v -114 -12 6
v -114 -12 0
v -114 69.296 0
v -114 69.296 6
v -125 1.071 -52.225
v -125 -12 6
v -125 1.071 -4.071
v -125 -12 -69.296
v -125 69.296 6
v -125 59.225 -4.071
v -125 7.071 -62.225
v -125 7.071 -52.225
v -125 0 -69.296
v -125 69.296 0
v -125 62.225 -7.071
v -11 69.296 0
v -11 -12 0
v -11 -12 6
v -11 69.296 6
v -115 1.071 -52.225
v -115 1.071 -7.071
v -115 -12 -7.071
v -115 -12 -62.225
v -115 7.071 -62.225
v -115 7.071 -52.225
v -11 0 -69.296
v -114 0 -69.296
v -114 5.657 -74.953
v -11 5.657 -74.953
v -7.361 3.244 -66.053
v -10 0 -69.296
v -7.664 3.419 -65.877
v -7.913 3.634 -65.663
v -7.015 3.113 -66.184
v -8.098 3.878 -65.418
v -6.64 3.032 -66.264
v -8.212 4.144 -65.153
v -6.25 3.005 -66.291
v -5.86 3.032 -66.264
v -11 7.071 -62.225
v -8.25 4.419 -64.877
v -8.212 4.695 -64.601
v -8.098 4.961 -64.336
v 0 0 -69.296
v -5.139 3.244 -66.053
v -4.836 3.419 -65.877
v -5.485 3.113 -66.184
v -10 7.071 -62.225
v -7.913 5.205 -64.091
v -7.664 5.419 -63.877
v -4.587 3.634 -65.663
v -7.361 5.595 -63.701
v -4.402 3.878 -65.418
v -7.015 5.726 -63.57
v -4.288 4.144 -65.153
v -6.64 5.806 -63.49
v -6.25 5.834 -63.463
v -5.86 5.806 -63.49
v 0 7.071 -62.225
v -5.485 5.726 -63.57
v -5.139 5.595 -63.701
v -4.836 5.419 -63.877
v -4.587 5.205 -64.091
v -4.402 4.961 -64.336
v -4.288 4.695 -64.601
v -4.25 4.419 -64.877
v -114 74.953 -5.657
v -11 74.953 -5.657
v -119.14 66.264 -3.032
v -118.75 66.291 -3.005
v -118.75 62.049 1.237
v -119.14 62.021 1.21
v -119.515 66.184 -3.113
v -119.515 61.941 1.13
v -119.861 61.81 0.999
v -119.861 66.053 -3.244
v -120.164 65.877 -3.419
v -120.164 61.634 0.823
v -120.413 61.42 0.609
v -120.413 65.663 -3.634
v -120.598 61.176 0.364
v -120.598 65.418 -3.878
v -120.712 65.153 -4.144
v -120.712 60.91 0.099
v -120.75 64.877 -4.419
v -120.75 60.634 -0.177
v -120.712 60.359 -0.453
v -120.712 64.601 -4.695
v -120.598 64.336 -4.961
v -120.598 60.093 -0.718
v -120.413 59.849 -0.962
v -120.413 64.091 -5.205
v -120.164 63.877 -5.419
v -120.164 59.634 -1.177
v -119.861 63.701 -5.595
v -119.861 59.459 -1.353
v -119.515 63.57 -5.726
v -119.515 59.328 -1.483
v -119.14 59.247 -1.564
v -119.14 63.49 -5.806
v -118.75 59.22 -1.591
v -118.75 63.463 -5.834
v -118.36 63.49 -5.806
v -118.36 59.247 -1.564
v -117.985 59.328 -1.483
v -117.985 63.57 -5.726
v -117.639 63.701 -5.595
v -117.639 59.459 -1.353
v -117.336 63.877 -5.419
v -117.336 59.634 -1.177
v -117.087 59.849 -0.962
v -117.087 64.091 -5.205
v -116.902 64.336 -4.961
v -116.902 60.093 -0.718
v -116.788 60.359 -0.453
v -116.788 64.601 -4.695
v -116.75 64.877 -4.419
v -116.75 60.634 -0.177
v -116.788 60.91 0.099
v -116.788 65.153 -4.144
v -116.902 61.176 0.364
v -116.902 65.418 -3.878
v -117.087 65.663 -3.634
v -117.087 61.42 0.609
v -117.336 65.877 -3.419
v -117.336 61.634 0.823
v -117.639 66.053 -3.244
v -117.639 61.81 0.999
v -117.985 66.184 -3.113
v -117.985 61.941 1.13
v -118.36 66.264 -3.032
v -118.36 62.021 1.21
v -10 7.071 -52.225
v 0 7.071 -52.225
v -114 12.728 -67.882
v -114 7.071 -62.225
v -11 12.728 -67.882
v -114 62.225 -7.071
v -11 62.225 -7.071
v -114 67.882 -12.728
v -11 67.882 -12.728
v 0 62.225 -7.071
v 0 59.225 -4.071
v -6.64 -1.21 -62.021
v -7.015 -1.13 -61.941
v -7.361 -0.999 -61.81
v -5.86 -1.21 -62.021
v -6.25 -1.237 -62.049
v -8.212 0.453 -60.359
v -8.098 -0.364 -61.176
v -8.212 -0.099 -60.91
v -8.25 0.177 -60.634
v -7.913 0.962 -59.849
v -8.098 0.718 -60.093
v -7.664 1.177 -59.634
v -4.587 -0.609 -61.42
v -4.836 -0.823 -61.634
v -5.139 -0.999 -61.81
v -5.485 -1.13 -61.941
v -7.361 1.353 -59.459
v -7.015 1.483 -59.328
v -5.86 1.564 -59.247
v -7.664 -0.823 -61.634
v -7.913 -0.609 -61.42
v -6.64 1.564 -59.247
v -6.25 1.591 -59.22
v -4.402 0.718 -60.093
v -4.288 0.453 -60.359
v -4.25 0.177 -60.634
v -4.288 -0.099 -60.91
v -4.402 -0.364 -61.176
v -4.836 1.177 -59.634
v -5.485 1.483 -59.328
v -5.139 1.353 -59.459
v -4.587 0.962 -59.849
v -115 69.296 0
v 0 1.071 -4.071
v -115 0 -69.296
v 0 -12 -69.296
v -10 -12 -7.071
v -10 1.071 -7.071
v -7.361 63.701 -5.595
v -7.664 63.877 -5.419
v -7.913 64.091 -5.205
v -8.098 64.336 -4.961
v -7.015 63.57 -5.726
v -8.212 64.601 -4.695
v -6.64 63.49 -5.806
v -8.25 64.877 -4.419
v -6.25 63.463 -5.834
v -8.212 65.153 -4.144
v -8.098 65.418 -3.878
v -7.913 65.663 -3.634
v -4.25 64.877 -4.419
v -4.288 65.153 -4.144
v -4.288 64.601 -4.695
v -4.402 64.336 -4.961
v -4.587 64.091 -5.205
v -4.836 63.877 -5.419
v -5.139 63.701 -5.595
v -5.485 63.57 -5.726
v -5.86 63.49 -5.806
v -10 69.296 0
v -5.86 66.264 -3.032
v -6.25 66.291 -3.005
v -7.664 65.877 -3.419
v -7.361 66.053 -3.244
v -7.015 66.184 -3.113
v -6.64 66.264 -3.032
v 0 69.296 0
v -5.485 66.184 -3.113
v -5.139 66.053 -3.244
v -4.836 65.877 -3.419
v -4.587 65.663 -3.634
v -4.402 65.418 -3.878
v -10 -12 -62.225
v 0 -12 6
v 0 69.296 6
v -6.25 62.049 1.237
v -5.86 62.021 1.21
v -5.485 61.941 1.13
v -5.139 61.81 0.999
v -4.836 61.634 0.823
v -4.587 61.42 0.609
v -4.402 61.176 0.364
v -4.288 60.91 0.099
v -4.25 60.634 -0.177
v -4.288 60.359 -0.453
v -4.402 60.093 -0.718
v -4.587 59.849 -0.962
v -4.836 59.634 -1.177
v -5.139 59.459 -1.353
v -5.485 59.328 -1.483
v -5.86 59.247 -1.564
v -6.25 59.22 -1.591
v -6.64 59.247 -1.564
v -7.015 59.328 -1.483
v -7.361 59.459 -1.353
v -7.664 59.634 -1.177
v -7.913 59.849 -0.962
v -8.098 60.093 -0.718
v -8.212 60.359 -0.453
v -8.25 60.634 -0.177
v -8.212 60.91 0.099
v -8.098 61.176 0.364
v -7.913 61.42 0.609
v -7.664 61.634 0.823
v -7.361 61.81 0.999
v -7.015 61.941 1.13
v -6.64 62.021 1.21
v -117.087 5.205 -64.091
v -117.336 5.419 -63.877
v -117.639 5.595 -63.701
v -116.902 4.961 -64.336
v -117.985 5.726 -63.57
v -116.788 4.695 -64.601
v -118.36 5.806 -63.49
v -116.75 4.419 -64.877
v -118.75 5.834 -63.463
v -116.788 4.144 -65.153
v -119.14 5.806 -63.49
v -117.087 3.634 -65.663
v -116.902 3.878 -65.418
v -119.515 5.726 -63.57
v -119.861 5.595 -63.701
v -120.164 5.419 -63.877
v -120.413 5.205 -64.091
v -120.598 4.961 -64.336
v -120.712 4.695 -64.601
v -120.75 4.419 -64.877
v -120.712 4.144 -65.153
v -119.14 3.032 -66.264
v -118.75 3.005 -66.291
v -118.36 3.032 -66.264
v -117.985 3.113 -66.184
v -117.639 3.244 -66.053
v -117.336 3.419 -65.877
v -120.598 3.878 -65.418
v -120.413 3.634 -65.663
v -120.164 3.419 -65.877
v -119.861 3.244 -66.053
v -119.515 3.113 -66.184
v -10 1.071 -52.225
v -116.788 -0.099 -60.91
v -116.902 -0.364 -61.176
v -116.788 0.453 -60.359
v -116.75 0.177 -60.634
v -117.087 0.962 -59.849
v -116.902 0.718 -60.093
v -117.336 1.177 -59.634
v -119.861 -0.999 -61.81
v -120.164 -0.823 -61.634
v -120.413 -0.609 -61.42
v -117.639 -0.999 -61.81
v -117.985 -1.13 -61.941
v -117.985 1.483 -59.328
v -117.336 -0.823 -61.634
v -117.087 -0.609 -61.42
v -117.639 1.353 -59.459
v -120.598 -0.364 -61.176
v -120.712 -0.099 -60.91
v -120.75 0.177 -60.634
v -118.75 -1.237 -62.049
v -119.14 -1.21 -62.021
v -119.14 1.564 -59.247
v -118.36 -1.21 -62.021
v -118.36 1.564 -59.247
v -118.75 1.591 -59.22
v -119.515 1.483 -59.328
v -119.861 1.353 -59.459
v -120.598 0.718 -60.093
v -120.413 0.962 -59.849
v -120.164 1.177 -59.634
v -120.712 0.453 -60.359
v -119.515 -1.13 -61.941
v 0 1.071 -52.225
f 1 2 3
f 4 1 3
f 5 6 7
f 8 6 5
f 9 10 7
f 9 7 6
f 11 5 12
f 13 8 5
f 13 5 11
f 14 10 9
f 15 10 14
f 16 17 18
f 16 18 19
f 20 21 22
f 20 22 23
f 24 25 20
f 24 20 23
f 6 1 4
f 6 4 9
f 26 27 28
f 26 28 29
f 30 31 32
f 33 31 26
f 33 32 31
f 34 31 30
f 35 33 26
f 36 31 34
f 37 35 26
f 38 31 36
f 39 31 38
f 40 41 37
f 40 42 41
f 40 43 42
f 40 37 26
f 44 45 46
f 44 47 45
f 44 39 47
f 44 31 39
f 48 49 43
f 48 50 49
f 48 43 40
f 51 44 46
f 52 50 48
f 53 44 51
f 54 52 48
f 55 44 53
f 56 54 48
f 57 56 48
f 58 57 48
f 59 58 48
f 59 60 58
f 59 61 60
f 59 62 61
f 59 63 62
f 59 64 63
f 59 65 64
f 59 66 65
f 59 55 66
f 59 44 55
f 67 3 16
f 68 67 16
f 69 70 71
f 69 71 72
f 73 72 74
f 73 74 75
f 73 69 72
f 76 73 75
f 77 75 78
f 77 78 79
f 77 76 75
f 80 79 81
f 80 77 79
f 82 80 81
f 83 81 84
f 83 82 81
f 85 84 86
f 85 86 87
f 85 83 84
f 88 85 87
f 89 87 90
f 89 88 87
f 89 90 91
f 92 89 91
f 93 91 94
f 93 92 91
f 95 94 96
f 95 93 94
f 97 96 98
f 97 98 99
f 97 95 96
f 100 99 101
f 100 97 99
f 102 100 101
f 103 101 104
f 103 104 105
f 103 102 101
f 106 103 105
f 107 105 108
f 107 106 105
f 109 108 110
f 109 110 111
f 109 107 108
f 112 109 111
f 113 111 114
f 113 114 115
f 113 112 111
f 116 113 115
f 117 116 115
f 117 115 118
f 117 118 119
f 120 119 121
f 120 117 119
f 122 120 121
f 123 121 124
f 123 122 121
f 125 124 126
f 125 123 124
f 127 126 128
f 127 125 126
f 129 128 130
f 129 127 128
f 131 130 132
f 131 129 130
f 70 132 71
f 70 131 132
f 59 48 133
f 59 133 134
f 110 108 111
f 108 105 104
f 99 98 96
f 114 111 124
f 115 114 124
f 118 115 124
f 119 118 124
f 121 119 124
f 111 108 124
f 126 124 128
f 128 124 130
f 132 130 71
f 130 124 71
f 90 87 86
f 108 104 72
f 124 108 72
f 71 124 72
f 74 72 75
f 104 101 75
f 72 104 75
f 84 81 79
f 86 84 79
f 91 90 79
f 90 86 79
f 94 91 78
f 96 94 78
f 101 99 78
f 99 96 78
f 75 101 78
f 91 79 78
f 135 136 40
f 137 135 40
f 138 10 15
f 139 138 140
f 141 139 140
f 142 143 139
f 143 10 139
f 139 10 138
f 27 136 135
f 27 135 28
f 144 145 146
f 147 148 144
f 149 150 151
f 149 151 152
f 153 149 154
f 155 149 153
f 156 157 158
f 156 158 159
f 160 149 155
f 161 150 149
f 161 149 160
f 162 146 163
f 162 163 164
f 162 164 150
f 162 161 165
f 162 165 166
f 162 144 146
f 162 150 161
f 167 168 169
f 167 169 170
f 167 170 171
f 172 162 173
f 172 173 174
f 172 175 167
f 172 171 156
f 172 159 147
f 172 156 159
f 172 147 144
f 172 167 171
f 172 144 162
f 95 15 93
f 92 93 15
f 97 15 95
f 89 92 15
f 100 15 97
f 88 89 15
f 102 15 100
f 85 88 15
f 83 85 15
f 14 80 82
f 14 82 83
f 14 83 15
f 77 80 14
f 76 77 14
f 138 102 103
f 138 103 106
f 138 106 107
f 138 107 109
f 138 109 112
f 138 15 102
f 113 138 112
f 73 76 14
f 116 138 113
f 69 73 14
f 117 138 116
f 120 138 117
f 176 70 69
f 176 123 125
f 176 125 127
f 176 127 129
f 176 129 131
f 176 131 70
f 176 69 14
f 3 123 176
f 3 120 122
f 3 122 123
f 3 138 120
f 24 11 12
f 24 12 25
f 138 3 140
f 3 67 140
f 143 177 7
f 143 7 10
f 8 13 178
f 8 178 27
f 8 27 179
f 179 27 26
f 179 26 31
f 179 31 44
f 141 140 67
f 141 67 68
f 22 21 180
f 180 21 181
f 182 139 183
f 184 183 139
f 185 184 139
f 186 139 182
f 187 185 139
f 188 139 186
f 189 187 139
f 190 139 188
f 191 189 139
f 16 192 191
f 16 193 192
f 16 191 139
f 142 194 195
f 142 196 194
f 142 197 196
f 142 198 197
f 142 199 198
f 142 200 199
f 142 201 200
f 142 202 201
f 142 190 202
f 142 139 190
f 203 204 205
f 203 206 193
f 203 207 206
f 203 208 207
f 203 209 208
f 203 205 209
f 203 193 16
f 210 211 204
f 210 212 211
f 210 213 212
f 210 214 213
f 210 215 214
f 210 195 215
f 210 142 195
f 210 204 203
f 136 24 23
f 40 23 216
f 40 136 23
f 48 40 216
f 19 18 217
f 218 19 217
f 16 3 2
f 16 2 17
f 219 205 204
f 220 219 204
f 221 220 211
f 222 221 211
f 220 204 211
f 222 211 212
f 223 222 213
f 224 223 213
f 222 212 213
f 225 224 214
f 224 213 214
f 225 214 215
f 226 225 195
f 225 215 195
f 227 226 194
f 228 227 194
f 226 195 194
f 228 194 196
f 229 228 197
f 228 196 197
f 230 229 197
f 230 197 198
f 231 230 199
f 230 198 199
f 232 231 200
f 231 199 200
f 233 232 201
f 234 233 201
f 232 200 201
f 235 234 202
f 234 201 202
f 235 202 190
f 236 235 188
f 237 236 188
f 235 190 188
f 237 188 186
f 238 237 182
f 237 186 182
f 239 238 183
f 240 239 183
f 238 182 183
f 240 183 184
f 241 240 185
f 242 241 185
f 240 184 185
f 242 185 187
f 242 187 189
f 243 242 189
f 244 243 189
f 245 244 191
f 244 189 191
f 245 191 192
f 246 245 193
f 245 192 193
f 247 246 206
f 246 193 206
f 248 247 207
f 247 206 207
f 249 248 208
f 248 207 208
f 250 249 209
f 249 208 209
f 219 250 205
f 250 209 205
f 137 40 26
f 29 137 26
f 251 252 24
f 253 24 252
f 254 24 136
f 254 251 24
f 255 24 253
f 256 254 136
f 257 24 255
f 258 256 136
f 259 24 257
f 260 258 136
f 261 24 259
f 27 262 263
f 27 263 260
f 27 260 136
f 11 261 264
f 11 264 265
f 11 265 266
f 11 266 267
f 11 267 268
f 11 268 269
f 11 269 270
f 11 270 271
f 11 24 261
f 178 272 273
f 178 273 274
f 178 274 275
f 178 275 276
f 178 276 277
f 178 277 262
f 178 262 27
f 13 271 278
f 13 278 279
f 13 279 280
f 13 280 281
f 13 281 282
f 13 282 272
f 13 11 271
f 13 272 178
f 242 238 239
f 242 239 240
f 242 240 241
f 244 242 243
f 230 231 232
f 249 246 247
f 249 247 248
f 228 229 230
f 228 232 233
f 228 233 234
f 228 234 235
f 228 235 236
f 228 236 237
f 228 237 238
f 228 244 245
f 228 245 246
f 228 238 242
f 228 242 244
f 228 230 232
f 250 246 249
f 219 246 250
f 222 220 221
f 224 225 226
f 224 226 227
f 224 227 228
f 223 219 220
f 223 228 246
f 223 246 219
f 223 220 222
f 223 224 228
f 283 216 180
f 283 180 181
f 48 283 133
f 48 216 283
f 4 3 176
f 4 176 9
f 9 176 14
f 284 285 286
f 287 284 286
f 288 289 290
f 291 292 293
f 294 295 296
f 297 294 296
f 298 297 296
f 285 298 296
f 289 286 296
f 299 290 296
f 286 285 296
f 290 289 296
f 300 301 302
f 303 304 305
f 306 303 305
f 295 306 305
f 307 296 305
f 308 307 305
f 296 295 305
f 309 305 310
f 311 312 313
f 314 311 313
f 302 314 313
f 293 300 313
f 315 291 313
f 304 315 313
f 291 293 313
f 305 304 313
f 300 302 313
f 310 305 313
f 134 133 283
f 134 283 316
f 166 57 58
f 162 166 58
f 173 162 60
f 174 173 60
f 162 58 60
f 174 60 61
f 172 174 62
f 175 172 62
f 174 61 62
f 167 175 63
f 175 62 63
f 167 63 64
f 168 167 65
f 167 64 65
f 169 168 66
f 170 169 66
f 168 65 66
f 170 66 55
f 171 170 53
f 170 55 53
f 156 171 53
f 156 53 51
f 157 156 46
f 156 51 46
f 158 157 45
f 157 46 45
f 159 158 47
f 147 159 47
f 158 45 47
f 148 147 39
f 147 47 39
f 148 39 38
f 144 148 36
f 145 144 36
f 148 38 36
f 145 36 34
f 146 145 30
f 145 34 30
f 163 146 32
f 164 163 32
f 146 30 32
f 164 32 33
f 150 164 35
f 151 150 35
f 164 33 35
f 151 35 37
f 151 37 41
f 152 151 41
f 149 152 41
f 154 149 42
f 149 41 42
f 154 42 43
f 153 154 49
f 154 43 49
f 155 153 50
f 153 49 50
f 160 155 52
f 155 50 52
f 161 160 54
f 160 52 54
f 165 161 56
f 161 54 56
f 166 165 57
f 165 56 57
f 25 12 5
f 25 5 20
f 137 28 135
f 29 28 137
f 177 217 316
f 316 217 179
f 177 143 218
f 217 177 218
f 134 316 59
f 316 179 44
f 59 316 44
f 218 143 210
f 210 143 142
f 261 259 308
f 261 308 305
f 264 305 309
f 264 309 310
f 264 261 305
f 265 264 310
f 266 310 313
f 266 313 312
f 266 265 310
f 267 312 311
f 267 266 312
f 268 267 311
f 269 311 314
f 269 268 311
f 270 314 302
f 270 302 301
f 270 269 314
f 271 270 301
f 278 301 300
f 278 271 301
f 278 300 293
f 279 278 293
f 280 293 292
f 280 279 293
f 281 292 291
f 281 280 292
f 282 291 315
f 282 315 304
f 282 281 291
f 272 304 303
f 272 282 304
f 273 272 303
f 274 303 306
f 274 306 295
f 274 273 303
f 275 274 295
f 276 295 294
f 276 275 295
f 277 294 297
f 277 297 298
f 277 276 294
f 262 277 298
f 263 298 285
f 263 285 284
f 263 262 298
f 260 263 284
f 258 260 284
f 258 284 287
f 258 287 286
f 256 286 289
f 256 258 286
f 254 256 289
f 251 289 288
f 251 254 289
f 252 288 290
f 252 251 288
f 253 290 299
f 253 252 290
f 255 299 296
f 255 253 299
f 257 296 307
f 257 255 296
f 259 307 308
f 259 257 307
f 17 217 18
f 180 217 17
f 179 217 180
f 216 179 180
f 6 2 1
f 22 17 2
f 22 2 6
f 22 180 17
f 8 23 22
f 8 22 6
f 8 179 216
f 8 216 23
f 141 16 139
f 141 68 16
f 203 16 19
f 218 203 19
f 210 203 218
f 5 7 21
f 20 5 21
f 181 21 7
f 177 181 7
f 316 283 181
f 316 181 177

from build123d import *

# Parameters (mm, degrees)
BOSS_EXTRUDE3_DEPTH  = 125
SKETCH3_W            = 125
SKETCH3_H            = 69.296464556
BOSS_EXTRUDE5_DEPTH  = 12
CUT_EXTRUDE1_DEPTH   = 159.836393815
SKETCH7_W            = 105
SKETCH7_H            = 10
BOSS_EXTRUDE6_DEPTH  = 8
SKETCH8_W            = 105
SKETCH8_H            = 10
BOSS_EXTRUDE7_DEPTH  = 8
SKETCH9_W            = 105
SKETCH9_H            = 55.154328932
CUT_EXTRUDE2_DEPTH   = 161.78246173
SKETCH11_W           = 10
SKETCH11_H           = 55.154328932
CUT_EXTRUDE3_DEPTH   = 6
SKETCH12_W           = 10
SKETCH12_H           = 55.154328932
CUT_EXTRUDE4_DEPTH   = 6
SKETCH13_W           = 105
SKETCH13_H           = 61.154328932
CUT_EXTRUDE6_DEPTH   = 3
SKETCH14_R           = 1.9
CUT_EXTRUDE8_DEPTH   = 6
SKETCH15_R           = 1.9
CUT_EXTRUDE9_DEPTH   = 6
BOSS_EXTRUDE9_REACH  = 158.4
SKETCH25_W           = 10
SKETCH25_H           = 6
BOSS_EXTRUDE13_DEPTH = 10
CUT_EXTRUDE10_DEPTH  = 1
CUT_EXTRUDE11_DEPTH  = 1
SKETCH29_W           = 11
SKETCH29_H           = 81.296464556
BOSS_EXTRUDE15_DEPTH = 6
SKETCH31_R           = 2
CUT_EXTRUDE16_DEPTH  = 6
SKETCH32_R           = 2
CUT_EXTRUDE17_DEPTH  = 6
CUT_EXTRUDE22_DEPTH  = 157.400127877
CUT_EXTRUDE23_DEPTH  = 157.400127877


with BuildPart() as part:
    # Sketch1 → Boss-Extrude3 (new body)
    with BuildSketch(Plane(origin=(0, 0, 0), x_dir=(0, 0, -1), z_dir=(1, 0, 0))):
        Polygon((0, 0), (69.296464556, 0), (0, 69.296464556), align=None)
    extrude(amount=-BOSS_EXTRUDE3_DEPTH)

    # Sketch3 → Boss-Extrude5 (add)
    with BuildSketch(Plane.XZ):
        with Locations((-62.5, -34.648232278)):
            Rectangle(SKETCH3_W, SKETCH3_H)
    extrude(amount=BOSS_EXTRUDE5_DEPTH)

    # Sketch6 → Cut-Extrude1 (cut, through all)
    with BuildSketch(Plane.ZY.offset(125)):
        Polygon((-7.071067812, 62.225396744), (-62.225396744, 7.071067812), (-7.071067812, 7.071067812), align=None)
    extrude(amount=-CUT_EXTRUDE1_DEPTH, mode=Mode.SUBTRACT)

    # Sketch7 → Boss-Extrude6 (add)
    with BuildSketch(Plane(origin=(0, 34.648232278, -34.648232278), x_dir=(1, 0, 0), z_dir=(0, 0.7071067811865515, -0.7071067811865436))):
        with Locations((-62.5, 44)):
            Rectangle(SKETCH7_W, SKETCH7_H)
    extrude(amount=BOSS_EXTRUDE6_DEPTH)

    # Sketch8 → Boss-Extrude7 (add)
    with BuildSketch(Plane(origin=(0, 34.648232278, -34.648232278), x_dir=(1, 0, 0), z_dir=(0, 0.7071067811865515, -0.7071067811865436))):
        with Locations((-62.5, -44)):
            Rectangle(SKETCH8_W, SKETCH8_H)
    extrude(amount=BOSS_EXTRUDE7_DEPTH)

    # Sketch9 → Cut-Extrude2 (cut, through all)
    with BuildSketch(Plane(origin=(0, 7.071067812, 0), x_dir=(1, 0, 0), z_dir=(0, 1, 0))):
        with Locations((-62.5, 34.648232278)):
            Rectangle(SKETCH9_W, SKETCH9_H)
    extrude(amount=-CUT_EXTRUDE2_DEPTH, mode=Mode.SUBTRACT)

    # Sketch11 → Cut-Extrude3 (cut)
    with BuildSketch(Plane(origin=(0, 7.071067812, 0), x_dir=(1, 0, 0), z_dir=(0, 1, 0))):
        with Locations((-5, 34.648232278)):
            Rectangle(SKETCH11_W, SKETCH11_H)
    extrude(amount=-CUT_EXTRUDE3_DEPTH, mode=Mode.SUBTRACT)

    # Sketch12 → Cut-Extrude4 (cut)
    with BuildSketch(Plane(origin=(0, 7.071067812, 0), x_dir=(1, 0, 0), z_dir=(0, 1, 0))):
        with Locations((-120, 34.648232278)):
            Rectangle(SKETCH12_W, SKETCH12_H)
    extrude(amount=-CUT_EXTRUDE4_DEPTH, mode=Mode.SUBTRACT)

    # Sketch13 → Cut-Extrude6 (cut)
    with BuildSketch(Plane(origin=(0, 0, -7.071067812), x_dir=(-1, 0, 0), z_dir=(0, 0, -1))):
        with Locations((62.5, 31.648232278)):
            Rectangle(SKETCH13_W, SKETCH13_H)
    extrude(amount=-CUT_EXTRUDE6_DEPTH, mode=Mode.SUBTRACT)

    # Sketch14 → Cut-Extrude8 (cut)
    with BuildSketch(Plane(origin=(0, 34.648232278, -34.648232278), x_dir=(1, 0, 0), z_dir=(0, 0.7071067811865515, -0.7071067811865436))):
        with Locations(Location((-6.25, 42.75, 0), (0, 0, 270))):
            Circle(SKETCH14_R)
    cut_extrude8 = extrude(amount=-CUT_EXTRUDE8_DEPTH, mode=Mode.SUBTRACT)

    # Mirror1: Cut-Extrude8 across plane
    add(cut_extrude8.mirror(Plane(origin=(-62.5, 0, 0), x_dir=(0, 0, 1), z_dir=(1, 0, 0))), mode=Mode.SUBTRACT)

    # Sketch15 → Cut-Extrude9 (cut)
    with BuildSketch(Plane(origin=(0, 34.648232278, -34.648232278), x_dir=(1, 0, 0), z_dir=(0, 0.7071067811865515, -0.7071067811865436))):
        with Locations(Location((-6.25, -42.75, 0), (0, 0, 270))):
            Circle(SKETCH15_R)
    cut_extrude9 = extrude(amount=-CUT_EXTRUDE9_DEPTH, mode=Mode.SUBTRACT)

    # Mirror2: Cut-Extrude9 across plane
    add(cut_extrude9.mirror(Plane(origin=(-62.5, 0, 0), x_dir=(0, 0, 1), z_dir=(1, 0, 0))), mode=Mode.SUBTRACT)

    # Sketch22 → Boss-Extrude9 (add, up to next)
    with BuildSketch(Plane.ZY.offset(10), mode=Mode.PRIVATE) as boss_extrude9_sk1:
        Polygon((-7.071067812, 62.225396744), (-4.071067812, 59.225396744), (-4.071067812, 62.225396744), align=None)
    boss_extrude9_tool1 = extrude(boss_extrude9_sk1.sketch, amount=BOSS_EXTRUDE9_REACH, mode=Mode.PRIVATE) - part.part
    add(boss_extrude9_tool1.solids().sort_by_distance((-10, 61.225397, -5.071068))[0])

    # Sketch25 → Boss-Extrude13 (add)
    with BuildSketch(Plane.XY.offset(-62.225396744)):
        with Locations((-5, 4.071067812)):
            Rectangle(SKETCH25_W, SKETCH25_H)
        with Locations((-120, 4.071067812)):
            Rectangle(SKETCH25_W, SKETCH25_H)
    extrude(amount=BOSS_EXTRUDE13_DEPTH)

    # Sketch26 → Cut-Extrude10 (cut)
    with BuildSketch(Plane(origin=(-10, 0, 0), x_dir=(0, 0, -1), z_dir=(1, 0, 0))):
        Polygon((0, 69.296464556), (7.071067812, 62.225396744), (12.727922061, 67.882250994), (5.656854249, 74.953318806), align=None)
    cut_extrude10 = extrude(amount=-CUT_EXTRUDE10_DEPTH, mode=Mode.SUBTRACT)

    # Sketch27 → Cut-Extrude11 (cut)
    with BuildSketch(Plane(origin=(-10, 0, 0), x_dir=(0, 0, -1), z_dir=(1, 0, 0))):
        Polygon((62.225396744, 7.071067812), (69.296464556, 0), (74.953318806, 5.656854249), (67.882250994, 12.727922061), align=None)
    cut_extrude11 = extrude(amount=-CUT_EXTRUDE11_DEPTH, mode=Mode.SUBTRACT)

    # Mirror3: Cut-Extrude10, Cut-Extrude11 across plane
    add(cut_extrude10.mirror(Plane(origin=(-62.5, 0, 0), x_dir=(0, 0, 1), z_dir=(1, 0, 0))), mode=Mode.SUBTRACT)
    add(cut_extrude11.mirror(Plane(origin=(-62.5, 0, 0), x_dir=(0, 0, 1), z_dir=(1, 0, 0))), mode=Mode.SUBTRACT)

    # Sketch29 → Boss-Extrude15 (add)
    with BuildSketch(Plane.XY):
        with Locations((-5.5, 28.648232278)):
            Rectangle(SKETCH29_W, SKETCH29_H)
    boss_extrude15 = extrude(amount=BOSS_EXTRUDE15_DEPTH)

    # Mirror4: Boss-Extrude15 across plane
    add(boss_extrude15.mirror(Plane(origin=(-62.5, 0, 0), x_dir=(0, 0, 1), z_dir=(1, 0, 0))))

    # Sketch31 → Cut-Extrude16 (cut)
    with BuildSketch(Plane(origin=(0, 34.648232278, -34.648232278), x_dir=(1, 0, 0), z_dir=(0, 0.7071067811865513, -0.7071067811865438))):
        with Locations(Location((-6.25, 42.75, 0), (0, 0, 270))):
            Circle(SKETCH31_R)
    cut_extrude16 = extrude(amount=-CUT_EXTRUDE16_DEPTH, mode=Mode.SUBTRACT)

    # Sketch32 → Cut-Extrude17 (cut)
    with BuildSketch(Plane(origin=(0, 34.648232278, -34.648232278), x_dir=(1, 0, 0), z_dir=(0, 0.7071067811865513, -0.7071067811865438))):
        with Locations(Location((-6.25, -42.75, 0), (0, 0, 270))):
            Circle(SKETCH32_R)
    cut_extrude17 = extrude(amount=-CUT_EXTRUDE17_DEPTH, mode=Mode.SUBTRACT)

    # Mirror5: Cut-Extrude16, Cut-Extrude17 across plane
    add(cut_extrude16.mirror(Plane(origin=(-62.5, 0, 0), x_dir=(0, 0, 1), z_dir=(1, 0, 0))), mode=Mode.SUBTRACT)
    add(cut_extrude17.mirror(Plane(origin=(-62.5, 0, 0), x_dir=(0, 0, 1), z_dir=(1, 0, 0))), mode=Mode.SUBTRACT)

    # Sketch41 → Cut-Extrude22 (cut, through all)
    with BuildSketch(Plane.ZY.offset(10)):
        Polygon((-7.071067812, 1.071067812), (-4.071067812, 1.071067812), (-4.071067812, 59.225396744), (-7.071067812, 62.225396744), align=None)
    extrude(amount=-CUT_EXTRUDE22_DEPTH, mode=Mode.SUBTRACT)

    # Sketch42 → Cut-Extrude23 (cut, through all)
    with BuildSketch(Plane(origin=(-115, 0, 0), x_dir=(0, 0, -1), z_dir=(1, 0, 0))):
        Polygon((7.071067812, 1.071067812), (4.071067812, 1.071067812), (4.071067812, 59.225396744), (7.071067812, 62.225396744), align=None)
    extrude(amount=-CUT_EXTRUDE23_DEPTH, mode=Mode.SUBTRACT)


solid = part.part
